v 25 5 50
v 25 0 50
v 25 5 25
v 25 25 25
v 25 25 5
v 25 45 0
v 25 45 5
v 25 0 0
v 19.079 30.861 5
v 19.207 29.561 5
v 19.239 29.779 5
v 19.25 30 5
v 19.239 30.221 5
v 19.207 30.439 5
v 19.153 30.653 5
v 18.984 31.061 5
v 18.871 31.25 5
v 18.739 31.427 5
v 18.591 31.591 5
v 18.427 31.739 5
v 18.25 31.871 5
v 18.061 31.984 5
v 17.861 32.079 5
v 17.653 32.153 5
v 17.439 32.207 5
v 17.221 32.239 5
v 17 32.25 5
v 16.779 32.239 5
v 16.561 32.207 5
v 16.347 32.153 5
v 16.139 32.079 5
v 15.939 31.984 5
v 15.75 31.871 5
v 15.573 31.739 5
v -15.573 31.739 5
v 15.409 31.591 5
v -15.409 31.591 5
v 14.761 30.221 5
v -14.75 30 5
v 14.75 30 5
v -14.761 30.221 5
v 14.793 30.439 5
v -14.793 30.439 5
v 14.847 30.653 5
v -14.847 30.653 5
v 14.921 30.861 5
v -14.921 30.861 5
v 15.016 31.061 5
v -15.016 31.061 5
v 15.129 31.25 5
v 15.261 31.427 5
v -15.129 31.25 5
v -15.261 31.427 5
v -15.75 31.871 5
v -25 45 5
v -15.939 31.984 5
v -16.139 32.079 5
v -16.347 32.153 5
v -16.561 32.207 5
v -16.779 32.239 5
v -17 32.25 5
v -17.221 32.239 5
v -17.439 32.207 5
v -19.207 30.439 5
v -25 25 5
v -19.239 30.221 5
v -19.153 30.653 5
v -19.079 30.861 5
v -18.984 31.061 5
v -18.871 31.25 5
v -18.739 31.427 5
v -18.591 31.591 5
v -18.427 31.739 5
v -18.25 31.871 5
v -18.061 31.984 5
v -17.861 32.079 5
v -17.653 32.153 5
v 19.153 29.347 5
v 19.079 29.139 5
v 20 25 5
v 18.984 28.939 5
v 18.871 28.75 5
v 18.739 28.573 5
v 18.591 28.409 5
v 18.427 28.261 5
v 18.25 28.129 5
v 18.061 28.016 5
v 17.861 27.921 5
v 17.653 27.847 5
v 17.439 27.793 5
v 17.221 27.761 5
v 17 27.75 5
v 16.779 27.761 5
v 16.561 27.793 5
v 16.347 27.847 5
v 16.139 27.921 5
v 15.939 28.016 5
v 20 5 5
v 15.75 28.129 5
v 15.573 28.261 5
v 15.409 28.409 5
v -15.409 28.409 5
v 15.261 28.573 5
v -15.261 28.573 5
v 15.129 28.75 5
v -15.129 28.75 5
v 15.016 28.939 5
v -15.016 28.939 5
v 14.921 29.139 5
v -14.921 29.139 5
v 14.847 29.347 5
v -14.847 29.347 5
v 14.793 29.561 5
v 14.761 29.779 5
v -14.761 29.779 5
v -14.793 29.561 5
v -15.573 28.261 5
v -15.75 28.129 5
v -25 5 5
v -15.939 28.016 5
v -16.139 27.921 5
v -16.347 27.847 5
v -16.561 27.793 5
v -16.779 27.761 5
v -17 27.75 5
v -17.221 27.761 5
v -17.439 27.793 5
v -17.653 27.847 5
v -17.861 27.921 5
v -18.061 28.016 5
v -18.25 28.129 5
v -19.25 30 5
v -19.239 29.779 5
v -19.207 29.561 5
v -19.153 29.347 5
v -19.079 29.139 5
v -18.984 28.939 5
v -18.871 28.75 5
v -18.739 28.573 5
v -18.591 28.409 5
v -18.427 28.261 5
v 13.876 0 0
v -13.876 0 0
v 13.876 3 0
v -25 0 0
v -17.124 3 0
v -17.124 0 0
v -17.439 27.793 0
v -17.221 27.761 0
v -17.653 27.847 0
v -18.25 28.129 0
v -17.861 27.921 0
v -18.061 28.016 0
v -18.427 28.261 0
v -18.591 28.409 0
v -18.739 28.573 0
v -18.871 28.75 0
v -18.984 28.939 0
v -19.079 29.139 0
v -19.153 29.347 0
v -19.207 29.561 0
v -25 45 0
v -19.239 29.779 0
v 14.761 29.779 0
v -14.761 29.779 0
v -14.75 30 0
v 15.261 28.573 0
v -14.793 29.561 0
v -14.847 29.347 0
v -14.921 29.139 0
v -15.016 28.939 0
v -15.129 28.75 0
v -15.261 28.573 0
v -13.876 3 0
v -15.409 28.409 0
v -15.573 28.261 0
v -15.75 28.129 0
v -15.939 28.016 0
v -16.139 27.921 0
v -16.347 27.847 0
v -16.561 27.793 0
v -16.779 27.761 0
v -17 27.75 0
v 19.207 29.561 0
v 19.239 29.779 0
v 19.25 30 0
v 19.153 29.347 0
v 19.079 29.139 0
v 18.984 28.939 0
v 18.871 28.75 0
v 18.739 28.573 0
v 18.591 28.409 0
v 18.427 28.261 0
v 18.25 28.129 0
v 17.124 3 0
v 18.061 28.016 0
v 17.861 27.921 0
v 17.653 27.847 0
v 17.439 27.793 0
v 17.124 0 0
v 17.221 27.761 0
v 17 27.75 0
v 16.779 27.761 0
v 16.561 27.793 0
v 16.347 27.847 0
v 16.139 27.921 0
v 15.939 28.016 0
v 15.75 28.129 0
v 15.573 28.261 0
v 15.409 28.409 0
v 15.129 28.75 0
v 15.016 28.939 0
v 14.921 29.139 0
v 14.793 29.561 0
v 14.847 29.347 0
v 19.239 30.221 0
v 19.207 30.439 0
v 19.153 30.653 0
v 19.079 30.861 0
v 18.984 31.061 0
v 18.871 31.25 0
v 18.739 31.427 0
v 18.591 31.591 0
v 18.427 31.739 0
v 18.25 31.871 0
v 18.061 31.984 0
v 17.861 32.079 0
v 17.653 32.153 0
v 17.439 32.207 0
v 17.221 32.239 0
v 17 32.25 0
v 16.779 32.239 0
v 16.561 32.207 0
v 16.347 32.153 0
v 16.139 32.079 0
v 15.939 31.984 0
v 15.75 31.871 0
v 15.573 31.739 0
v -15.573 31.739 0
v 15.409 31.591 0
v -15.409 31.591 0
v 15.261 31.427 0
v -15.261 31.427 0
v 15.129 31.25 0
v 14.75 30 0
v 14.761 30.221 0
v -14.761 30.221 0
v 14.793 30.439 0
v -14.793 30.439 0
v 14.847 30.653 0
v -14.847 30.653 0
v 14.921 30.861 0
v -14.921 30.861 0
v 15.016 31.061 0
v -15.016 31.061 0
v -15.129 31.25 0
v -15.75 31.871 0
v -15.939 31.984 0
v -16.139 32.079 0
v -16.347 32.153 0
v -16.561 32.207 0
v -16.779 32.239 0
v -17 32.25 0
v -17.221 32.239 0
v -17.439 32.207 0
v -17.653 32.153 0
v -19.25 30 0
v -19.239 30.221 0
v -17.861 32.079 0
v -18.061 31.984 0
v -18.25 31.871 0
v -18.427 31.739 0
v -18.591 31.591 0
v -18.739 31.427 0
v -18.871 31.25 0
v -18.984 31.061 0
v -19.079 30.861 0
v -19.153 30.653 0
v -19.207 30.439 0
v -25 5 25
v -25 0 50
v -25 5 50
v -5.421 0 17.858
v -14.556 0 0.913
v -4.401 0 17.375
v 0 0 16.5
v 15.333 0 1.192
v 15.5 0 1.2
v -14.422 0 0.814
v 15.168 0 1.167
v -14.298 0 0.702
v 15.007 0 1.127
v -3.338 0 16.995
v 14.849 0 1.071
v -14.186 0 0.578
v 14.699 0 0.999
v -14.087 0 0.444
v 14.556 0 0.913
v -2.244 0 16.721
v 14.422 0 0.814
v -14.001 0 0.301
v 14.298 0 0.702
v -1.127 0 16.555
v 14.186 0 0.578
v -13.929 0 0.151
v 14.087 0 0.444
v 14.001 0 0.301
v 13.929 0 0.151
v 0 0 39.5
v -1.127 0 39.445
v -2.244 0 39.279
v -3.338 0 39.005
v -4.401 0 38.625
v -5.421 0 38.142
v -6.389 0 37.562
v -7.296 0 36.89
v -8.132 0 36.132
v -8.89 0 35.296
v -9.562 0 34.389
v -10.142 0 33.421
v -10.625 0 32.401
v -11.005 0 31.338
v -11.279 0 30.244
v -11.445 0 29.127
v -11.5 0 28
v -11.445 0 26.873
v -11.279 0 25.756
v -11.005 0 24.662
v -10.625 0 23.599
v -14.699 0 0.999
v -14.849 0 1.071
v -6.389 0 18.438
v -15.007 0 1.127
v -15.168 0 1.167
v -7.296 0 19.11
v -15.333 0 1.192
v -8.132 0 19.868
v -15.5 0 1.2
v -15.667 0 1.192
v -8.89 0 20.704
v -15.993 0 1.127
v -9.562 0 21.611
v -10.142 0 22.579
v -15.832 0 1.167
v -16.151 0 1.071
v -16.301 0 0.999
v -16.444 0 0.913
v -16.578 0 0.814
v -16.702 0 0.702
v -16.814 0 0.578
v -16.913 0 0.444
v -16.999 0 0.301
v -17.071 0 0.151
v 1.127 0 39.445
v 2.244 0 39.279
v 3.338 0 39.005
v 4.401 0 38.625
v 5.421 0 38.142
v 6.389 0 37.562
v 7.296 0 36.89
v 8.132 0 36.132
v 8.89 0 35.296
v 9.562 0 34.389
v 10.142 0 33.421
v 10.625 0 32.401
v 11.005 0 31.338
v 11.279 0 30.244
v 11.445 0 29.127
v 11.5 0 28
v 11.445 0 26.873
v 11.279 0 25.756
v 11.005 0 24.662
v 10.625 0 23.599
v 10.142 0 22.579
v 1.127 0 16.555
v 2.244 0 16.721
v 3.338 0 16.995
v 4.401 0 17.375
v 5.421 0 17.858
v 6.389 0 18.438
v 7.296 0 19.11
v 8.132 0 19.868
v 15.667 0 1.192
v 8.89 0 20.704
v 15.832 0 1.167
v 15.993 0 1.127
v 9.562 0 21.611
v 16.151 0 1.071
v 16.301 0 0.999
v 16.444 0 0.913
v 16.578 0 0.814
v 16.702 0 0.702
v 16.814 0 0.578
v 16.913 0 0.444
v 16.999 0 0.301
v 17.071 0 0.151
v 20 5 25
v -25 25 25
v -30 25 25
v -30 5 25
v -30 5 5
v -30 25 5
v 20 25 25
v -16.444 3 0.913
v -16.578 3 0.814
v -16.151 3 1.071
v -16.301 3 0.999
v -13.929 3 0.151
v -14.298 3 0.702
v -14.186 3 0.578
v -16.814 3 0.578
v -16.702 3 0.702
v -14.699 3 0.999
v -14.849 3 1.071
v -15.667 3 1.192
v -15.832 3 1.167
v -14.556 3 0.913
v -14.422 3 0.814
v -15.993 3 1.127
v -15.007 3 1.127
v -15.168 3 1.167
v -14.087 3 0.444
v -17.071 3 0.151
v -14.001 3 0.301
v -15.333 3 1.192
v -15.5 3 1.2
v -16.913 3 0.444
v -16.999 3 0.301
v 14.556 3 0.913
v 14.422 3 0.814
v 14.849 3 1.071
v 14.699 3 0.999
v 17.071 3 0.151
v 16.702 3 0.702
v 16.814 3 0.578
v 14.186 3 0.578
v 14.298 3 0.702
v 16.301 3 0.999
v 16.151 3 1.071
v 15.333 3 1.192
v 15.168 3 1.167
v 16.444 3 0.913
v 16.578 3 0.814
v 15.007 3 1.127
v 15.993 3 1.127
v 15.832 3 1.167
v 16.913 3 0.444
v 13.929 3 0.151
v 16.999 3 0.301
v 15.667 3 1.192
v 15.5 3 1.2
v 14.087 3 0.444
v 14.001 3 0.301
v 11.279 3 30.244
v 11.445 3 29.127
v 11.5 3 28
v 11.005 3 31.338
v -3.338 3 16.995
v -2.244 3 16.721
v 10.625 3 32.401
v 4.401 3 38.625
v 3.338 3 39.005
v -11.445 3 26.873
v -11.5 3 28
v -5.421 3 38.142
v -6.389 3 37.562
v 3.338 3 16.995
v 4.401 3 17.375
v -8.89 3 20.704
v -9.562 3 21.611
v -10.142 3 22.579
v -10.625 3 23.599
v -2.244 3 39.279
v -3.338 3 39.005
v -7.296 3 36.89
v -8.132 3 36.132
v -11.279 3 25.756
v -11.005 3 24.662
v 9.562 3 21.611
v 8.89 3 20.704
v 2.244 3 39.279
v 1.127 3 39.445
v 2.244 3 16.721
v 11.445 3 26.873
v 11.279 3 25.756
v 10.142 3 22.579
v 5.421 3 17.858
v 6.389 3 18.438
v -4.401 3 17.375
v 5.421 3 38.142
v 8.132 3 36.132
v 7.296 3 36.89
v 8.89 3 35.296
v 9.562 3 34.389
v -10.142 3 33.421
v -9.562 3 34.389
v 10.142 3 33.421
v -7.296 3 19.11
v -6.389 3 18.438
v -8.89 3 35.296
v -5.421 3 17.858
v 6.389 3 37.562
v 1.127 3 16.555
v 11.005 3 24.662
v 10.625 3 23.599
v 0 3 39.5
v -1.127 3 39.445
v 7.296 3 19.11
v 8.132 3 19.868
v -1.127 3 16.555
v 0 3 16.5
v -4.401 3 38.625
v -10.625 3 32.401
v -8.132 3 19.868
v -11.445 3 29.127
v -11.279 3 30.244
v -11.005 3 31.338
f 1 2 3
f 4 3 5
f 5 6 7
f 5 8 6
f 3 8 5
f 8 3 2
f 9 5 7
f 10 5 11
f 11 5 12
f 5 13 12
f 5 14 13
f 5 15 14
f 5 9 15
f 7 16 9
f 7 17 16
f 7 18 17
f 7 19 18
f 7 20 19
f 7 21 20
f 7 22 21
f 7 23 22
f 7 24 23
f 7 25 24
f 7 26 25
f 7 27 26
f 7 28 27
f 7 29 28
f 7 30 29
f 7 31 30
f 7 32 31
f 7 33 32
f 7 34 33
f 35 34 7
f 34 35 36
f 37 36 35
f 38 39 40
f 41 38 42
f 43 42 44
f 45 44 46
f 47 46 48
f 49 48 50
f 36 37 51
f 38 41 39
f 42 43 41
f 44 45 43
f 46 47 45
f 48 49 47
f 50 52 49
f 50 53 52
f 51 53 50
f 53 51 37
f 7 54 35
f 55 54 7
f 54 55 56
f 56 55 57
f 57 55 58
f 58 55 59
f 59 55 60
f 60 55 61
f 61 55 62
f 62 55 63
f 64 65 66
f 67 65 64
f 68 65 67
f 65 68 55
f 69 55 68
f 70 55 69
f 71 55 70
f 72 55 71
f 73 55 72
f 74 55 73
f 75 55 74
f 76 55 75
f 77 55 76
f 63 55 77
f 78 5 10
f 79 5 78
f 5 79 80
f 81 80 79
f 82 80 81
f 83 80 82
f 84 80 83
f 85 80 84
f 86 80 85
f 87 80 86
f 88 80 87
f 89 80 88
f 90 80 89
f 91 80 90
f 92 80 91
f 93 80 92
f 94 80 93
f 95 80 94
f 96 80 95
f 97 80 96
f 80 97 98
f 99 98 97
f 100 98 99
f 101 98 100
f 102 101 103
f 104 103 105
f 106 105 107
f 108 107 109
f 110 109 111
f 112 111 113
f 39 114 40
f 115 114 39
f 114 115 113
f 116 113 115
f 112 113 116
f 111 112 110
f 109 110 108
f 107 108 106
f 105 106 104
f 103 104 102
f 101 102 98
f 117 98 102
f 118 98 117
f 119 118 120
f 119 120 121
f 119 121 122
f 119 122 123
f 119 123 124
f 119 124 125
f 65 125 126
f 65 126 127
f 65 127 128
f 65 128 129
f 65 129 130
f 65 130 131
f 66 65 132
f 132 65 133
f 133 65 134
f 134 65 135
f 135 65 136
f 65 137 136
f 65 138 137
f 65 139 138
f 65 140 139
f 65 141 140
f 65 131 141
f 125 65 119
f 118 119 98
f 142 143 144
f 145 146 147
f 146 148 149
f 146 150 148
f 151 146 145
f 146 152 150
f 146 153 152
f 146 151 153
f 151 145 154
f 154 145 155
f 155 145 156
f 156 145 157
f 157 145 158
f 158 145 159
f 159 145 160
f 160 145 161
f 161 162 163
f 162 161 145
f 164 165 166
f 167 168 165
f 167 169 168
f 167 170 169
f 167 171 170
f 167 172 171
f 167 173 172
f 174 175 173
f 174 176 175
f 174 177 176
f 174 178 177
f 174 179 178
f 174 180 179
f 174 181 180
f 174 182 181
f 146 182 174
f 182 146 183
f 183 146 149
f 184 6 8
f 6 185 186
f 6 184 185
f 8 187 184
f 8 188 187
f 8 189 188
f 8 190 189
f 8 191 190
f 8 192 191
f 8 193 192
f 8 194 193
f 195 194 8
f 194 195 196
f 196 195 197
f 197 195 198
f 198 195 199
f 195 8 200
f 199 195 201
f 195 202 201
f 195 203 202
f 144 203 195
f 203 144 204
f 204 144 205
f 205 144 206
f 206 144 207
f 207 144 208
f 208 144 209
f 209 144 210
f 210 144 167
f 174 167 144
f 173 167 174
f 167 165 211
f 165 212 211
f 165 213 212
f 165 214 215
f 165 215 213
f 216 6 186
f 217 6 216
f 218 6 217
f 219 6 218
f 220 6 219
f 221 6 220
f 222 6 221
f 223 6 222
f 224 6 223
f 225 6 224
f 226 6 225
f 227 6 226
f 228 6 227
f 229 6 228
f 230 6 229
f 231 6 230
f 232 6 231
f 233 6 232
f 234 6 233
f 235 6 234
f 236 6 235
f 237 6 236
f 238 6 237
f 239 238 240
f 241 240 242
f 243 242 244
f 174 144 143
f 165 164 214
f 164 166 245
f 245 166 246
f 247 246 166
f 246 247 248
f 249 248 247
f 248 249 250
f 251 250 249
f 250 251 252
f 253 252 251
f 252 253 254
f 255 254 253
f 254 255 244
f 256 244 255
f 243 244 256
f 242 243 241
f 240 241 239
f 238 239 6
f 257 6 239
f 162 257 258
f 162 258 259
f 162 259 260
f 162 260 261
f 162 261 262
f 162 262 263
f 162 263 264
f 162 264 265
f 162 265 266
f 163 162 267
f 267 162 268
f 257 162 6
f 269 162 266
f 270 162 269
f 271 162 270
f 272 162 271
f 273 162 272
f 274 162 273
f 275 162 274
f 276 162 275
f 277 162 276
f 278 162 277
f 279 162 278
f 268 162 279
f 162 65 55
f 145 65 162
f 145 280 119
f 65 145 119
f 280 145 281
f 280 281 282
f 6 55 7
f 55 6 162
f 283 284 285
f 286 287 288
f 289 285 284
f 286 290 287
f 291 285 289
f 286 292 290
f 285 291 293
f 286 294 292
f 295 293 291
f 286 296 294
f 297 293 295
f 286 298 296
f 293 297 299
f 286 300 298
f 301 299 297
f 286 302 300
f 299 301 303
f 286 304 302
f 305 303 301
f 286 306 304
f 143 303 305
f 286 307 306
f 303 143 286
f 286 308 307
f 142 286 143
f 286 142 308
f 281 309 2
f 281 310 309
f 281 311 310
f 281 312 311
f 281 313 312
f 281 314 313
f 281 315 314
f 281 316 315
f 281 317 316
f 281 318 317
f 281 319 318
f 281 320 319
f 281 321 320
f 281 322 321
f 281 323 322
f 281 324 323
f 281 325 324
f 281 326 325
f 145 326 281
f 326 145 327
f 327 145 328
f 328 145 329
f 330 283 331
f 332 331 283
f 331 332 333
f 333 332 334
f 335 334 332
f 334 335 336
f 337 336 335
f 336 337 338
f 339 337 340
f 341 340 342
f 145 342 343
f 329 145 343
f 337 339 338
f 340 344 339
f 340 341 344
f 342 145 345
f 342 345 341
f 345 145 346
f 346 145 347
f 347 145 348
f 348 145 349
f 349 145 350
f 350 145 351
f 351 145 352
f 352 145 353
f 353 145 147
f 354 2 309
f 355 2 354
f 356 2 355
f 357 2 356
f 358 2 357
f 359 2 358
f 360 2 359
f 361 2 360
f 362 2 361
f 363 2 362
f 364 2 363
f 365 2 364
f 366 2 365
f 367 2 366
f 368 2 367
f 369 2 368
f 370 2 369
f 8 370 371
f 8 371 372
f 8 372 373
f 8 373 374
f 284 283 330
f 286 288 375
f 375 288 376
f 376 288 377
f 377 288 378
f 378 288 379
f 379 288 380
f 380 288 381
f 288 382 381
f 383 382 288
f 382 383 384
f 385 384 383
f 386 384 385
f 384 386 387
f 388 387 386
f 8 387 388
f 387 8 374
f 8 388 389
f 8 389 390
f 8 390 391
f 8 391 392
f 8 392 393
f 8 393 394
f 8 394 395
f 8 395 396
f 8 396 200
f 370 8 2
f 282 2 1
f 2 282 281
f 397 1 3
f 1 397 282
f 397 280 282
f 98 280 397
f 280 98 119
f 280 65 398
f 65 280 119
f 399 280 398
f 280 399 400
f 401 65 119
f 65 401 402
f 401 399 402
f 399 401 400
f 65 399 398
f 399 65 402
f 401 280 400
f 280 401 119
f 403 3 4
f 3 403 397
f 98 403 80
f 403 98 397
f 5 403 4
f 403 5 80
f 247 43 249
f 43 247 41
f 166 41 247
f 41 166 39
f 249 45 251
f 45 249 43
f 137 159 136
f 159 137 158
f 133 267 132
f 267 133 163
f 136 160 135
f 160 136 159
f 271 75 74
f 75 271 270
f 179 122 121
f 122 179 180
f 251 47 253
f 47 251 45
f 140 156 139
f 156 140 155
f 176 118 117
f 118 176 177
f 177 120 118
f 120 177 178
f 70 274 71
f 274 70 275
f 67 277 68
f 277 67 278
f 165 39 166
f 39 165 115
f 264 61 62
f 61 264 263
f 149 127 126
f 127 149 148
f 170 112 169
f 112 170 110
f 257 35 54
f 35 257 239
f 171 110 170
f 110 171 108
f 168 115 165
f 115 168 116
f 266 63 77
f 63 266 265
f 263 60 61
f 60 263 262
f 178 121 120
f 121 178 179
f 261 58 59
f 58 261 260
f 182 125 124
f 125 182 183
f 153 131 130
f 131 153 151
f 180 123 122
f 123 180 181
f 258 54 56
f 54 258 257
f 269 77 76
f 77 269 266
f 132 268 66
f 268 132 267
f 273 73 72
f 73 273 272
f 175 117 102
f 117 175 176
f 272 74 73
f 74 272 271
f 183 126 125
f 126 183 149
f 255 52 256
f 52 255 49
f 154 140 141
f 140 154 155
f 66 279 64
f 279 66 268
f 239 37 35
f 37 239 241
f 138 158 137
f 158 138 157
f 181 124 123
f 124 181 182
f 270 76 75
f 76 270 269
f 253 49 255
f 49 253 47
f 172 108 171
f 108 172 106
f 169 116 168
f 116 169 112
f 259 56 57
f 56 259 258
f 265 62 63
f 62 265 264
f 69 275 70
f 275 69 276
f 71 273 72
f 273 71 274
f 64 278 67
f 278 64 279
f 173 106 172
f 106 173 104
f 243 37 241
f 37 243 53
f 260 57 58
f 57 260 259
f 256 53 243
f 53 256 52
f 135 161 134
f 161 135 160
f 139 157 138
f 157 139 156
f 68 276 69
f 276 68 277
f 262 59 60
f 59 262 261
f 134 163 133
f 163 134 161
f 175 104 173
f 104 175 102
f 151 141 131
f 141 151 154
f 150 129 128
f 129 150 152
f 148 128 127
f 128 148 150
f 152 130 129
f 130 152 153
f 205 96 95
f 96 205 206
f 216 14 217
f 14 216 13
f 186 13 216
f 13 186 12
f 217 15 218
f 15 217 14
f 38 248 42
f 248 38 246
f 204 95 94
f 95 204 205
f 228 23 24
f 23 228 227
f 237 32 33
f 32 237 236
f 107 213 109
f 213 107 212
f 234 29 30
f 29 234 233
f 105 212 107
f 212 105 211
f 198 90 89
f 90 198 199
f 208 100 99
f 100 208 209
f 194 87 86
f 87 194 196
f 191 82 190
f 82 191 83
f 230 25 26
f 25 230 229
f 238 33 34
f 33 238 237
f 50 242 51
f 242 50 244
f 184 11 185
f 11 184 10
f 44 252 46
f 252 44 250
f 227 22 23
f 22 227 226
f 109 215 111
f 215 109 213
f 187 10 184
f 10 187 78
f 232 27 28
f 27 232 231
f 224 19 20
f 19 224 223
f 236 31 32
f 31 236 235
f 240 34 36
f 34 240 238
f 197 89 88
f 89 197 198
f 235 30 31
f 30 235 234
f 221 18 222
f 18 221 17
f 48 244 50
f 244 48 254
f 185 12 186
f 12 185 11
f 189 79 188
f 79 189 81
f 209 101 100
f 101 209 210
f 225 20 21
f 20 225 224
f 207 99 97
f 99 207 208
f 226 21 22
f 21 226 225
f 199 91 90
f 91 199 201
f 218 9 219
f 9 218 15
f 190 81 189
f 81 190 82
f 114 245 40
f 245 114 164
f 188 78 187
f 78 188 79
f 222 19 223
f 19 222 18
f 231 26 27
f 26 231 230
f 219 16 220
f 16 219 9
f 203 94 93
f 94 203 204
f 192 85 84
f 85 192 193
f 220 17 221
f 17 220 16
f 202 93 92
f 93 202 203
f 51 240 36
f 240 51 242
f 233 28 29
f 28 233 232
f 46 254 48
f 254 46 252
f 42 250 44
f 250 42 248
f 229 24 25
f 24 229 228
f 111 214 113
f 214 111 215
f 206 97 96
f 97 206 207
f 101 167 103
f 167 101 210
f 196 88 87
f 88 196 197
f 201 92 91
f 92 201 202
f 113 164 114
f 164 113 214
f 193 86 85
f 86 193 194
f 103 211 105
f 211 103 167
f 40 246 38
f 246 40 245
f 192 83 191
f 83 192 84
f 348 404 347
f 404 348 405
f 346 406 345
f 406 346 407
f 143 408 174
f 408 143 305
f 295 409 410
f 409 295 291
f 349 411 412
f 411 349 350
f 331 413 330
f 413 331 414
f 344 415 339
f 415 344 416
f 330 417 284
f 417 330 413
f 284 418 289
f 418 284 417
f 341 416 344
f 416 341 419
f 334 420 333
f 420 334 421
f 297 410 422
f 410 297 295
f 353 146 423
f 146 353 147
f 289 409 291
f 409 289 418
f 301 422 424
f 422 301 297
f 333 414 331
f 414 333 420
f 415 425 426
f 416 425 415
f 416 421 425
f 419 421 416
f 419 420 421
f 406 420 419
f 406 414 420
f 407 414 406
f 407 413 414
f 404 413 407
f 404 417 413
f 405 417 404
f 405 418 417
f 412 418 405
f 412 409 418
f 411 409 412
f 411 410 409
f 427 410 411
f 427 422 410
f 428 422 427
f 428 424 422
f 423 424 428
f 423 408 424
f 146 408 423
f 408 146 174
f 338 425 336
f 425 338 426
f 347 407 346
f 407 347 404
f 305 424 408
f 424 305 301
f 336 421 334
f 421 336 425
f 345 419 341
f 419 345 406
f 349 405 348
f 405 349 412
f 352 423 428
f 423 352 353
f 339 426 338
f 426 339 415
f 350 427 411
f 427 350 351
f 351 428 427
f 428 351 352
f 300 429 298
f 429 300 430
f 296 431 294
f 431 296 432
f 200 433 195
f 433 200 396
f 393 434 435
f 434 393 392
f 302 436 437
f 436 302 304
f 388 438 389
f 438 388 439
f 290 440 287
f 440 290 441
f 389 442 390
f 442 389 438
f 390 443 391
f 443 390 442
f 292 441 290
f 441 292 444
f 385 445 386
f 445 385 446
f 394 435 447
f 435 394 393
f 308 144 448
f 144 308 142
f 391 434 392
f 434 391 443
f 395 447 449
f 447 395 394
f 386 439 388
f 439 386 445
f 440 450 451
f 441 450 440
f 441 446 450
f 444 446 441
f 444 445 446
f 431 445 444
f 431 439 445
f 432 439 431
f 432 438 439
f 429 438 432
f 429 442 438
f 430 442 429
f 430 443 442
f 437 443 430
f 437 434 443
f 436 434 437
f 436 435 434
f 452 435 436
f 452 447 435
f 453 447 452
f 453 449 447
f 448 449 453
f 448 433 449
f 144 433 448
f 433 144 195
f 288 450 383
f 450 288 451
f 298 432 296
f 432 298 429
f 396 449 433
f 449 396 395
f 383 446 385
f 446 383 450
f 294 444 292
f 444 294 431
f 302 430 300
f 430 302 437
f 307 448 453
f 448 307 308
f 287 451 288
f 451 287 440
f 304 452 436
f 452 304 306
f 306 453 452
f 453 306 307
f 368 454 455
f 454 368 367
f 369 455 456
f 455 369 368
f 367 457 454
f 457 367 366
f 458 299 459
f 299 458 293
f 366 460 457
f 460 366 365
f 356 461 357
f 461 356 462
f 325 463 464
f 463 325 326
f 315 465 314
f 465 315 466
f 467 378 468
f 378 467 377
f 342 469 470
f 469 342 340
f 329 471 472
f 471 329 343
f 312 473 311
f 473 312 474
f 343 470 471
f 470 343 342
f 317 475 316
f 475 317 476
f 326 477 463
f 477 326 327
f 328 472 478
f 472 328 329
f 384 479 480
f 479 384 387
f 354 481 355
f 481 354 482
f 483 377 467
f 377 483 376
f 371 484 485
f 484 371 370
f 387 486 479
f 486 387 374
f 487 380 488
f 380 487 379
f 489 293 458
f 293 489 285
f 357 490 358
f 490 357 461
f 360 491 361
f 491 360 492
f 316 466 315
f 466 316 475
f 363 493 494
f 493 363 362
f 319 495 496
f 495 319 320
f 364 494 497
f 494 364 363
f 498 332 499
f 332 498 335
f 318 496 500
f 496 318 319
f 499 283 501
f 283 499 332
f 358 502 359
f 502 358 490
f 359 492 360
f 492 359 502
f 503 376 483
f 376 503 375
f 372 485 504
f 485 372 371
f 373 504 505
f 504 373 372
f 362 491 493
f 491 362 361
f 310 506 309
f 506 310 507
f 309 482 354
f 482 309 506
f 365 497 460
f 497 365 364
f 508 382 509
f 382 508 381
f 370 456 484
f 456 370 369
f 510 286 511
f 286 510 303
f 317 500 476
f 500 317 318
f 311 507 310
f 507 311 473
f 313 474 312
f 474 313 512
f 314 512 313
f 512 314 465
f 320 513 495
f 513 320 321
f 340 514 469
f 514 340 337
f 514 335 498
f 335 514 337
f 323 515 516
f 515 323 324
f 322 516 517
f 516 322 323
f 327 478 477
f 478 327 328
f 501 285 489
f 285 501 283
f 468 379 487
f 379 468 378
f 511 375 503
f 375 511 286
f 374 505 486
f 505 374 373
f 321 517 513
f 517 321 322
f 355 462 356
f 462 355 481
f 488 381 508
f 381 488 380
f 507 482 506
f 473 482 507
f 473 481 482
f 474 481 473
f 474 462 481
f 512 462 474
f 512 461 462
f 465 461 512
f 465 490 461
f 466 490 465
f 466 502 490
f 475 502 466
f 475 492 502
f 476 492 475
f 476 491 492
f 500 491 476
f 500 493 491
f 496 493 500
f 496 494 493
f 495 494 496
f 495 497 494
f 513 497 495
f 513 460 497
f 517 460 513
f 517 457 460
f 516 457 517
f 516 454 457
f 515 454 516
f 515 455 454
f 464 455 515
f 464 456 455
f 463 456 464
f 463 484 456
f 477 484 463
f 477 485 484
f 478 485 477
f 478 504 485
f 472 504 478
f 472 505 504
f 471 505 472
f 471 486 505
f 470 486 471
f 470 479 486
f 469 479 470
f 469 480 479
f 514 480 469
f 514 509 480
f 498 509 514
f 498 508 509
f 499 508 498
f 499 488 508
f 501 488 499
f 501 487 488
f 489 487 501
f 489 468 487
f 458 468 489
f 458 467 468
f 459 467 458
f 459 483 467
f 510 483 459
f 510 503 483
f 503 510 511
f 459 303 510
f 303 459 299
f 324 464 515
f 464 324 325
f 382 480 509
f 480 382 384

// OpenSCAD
// L-shaped mounting bracket for NEMA 17 stepper motor (e.g. syringe pump)
// Print orientation: base plate on bed, motor plate builds upward (+Z)

$fn = 64;

// ---- Base plate ----
base_x = 25;              // plate spans x = -25 .. 25
base_y = 45;              // plate spans y = 0 .. 45
base_t = 5;               // plate thickness (z = 0 .. 5)

// ---- Motor plate ----
motor_x = 25;             // plate spans x = -25 .. 25
motor_y = 5;              // plate spans y = 0 .. 5
motor_h = 50;             // plate height (z = 0 .. 50)

// ---- Boss hole (motor centring boss) ----
boss_d = 23;              // hole diameter
boss_x = 0;               // hole centre x
boss_z = 28;              // hole centre z

// ---- Screw holes (M3, on square pattern) ----
screw_d = 3.4;            // hole diameter
screw_n = 4;              // number of holes
screw_p = 31;             // square pitch (centred on boss hole)

// ---- Gussets ----
gusset_t = 5;             // gusset thickness (X)
gusset_leg = 20;          // right-triangle legs along +Y and +Z
gusset_y0 = 5;            // right-angle corner y
gusset_z0 = 5;            // right-angle corner z

// ---- Misc ----
eps = 0.5;                // cutter overshoot past faces

difference() {
    union() {
        // Base plate
        translate([-base_x, 0, 0])
            cube([2 * base_x, base_y, base_t]);

        // Motor plate (overlaps base slightly for a clean union)
        translate([-motor_x, 0, 0])
            cube([2 * motor_x, motor_y, motor_h]);

        // Gusset: left edge (x = -25 .. -20)
        translate([-base_x - gusset_t, gusset_y0, gusset_z0])
            cube([gusset_t, gusset_leg, gusset_leg]);

        // Gusset: right edge (x = 20 .. 25)
        translate([base_x - gusset_t, gusset_y0, gusset_z0])
            cube([gusset_t, gusset_leg, gusset_leg]);
    }

    // Base plate through-holes (M4)
    for (sx = [-1, 1], sy = 30)
        translate([sx * 17, sy, -eps])
            cylinder(d = 4.5, h = base_t + 2 * eps);

    // Boss hole (along Y)
    translate([boss_x, 0, boss_z])
        rotate([90, 0, 0])
            cylinder(d = boss_d, h = motor_y + 2 * eps, center = true);

    // Screw holes (along Y)
    for (i = [0 : screw_n - 1]) {
        x = (i - (screw_n - 1) / 2) * screw_p;
        translate([x, 0, -eps])
            rotate([90, 0, 0])
                cylinder(d = screw_d, h = motor_y + 2 * eps, center = true);
    }
}
